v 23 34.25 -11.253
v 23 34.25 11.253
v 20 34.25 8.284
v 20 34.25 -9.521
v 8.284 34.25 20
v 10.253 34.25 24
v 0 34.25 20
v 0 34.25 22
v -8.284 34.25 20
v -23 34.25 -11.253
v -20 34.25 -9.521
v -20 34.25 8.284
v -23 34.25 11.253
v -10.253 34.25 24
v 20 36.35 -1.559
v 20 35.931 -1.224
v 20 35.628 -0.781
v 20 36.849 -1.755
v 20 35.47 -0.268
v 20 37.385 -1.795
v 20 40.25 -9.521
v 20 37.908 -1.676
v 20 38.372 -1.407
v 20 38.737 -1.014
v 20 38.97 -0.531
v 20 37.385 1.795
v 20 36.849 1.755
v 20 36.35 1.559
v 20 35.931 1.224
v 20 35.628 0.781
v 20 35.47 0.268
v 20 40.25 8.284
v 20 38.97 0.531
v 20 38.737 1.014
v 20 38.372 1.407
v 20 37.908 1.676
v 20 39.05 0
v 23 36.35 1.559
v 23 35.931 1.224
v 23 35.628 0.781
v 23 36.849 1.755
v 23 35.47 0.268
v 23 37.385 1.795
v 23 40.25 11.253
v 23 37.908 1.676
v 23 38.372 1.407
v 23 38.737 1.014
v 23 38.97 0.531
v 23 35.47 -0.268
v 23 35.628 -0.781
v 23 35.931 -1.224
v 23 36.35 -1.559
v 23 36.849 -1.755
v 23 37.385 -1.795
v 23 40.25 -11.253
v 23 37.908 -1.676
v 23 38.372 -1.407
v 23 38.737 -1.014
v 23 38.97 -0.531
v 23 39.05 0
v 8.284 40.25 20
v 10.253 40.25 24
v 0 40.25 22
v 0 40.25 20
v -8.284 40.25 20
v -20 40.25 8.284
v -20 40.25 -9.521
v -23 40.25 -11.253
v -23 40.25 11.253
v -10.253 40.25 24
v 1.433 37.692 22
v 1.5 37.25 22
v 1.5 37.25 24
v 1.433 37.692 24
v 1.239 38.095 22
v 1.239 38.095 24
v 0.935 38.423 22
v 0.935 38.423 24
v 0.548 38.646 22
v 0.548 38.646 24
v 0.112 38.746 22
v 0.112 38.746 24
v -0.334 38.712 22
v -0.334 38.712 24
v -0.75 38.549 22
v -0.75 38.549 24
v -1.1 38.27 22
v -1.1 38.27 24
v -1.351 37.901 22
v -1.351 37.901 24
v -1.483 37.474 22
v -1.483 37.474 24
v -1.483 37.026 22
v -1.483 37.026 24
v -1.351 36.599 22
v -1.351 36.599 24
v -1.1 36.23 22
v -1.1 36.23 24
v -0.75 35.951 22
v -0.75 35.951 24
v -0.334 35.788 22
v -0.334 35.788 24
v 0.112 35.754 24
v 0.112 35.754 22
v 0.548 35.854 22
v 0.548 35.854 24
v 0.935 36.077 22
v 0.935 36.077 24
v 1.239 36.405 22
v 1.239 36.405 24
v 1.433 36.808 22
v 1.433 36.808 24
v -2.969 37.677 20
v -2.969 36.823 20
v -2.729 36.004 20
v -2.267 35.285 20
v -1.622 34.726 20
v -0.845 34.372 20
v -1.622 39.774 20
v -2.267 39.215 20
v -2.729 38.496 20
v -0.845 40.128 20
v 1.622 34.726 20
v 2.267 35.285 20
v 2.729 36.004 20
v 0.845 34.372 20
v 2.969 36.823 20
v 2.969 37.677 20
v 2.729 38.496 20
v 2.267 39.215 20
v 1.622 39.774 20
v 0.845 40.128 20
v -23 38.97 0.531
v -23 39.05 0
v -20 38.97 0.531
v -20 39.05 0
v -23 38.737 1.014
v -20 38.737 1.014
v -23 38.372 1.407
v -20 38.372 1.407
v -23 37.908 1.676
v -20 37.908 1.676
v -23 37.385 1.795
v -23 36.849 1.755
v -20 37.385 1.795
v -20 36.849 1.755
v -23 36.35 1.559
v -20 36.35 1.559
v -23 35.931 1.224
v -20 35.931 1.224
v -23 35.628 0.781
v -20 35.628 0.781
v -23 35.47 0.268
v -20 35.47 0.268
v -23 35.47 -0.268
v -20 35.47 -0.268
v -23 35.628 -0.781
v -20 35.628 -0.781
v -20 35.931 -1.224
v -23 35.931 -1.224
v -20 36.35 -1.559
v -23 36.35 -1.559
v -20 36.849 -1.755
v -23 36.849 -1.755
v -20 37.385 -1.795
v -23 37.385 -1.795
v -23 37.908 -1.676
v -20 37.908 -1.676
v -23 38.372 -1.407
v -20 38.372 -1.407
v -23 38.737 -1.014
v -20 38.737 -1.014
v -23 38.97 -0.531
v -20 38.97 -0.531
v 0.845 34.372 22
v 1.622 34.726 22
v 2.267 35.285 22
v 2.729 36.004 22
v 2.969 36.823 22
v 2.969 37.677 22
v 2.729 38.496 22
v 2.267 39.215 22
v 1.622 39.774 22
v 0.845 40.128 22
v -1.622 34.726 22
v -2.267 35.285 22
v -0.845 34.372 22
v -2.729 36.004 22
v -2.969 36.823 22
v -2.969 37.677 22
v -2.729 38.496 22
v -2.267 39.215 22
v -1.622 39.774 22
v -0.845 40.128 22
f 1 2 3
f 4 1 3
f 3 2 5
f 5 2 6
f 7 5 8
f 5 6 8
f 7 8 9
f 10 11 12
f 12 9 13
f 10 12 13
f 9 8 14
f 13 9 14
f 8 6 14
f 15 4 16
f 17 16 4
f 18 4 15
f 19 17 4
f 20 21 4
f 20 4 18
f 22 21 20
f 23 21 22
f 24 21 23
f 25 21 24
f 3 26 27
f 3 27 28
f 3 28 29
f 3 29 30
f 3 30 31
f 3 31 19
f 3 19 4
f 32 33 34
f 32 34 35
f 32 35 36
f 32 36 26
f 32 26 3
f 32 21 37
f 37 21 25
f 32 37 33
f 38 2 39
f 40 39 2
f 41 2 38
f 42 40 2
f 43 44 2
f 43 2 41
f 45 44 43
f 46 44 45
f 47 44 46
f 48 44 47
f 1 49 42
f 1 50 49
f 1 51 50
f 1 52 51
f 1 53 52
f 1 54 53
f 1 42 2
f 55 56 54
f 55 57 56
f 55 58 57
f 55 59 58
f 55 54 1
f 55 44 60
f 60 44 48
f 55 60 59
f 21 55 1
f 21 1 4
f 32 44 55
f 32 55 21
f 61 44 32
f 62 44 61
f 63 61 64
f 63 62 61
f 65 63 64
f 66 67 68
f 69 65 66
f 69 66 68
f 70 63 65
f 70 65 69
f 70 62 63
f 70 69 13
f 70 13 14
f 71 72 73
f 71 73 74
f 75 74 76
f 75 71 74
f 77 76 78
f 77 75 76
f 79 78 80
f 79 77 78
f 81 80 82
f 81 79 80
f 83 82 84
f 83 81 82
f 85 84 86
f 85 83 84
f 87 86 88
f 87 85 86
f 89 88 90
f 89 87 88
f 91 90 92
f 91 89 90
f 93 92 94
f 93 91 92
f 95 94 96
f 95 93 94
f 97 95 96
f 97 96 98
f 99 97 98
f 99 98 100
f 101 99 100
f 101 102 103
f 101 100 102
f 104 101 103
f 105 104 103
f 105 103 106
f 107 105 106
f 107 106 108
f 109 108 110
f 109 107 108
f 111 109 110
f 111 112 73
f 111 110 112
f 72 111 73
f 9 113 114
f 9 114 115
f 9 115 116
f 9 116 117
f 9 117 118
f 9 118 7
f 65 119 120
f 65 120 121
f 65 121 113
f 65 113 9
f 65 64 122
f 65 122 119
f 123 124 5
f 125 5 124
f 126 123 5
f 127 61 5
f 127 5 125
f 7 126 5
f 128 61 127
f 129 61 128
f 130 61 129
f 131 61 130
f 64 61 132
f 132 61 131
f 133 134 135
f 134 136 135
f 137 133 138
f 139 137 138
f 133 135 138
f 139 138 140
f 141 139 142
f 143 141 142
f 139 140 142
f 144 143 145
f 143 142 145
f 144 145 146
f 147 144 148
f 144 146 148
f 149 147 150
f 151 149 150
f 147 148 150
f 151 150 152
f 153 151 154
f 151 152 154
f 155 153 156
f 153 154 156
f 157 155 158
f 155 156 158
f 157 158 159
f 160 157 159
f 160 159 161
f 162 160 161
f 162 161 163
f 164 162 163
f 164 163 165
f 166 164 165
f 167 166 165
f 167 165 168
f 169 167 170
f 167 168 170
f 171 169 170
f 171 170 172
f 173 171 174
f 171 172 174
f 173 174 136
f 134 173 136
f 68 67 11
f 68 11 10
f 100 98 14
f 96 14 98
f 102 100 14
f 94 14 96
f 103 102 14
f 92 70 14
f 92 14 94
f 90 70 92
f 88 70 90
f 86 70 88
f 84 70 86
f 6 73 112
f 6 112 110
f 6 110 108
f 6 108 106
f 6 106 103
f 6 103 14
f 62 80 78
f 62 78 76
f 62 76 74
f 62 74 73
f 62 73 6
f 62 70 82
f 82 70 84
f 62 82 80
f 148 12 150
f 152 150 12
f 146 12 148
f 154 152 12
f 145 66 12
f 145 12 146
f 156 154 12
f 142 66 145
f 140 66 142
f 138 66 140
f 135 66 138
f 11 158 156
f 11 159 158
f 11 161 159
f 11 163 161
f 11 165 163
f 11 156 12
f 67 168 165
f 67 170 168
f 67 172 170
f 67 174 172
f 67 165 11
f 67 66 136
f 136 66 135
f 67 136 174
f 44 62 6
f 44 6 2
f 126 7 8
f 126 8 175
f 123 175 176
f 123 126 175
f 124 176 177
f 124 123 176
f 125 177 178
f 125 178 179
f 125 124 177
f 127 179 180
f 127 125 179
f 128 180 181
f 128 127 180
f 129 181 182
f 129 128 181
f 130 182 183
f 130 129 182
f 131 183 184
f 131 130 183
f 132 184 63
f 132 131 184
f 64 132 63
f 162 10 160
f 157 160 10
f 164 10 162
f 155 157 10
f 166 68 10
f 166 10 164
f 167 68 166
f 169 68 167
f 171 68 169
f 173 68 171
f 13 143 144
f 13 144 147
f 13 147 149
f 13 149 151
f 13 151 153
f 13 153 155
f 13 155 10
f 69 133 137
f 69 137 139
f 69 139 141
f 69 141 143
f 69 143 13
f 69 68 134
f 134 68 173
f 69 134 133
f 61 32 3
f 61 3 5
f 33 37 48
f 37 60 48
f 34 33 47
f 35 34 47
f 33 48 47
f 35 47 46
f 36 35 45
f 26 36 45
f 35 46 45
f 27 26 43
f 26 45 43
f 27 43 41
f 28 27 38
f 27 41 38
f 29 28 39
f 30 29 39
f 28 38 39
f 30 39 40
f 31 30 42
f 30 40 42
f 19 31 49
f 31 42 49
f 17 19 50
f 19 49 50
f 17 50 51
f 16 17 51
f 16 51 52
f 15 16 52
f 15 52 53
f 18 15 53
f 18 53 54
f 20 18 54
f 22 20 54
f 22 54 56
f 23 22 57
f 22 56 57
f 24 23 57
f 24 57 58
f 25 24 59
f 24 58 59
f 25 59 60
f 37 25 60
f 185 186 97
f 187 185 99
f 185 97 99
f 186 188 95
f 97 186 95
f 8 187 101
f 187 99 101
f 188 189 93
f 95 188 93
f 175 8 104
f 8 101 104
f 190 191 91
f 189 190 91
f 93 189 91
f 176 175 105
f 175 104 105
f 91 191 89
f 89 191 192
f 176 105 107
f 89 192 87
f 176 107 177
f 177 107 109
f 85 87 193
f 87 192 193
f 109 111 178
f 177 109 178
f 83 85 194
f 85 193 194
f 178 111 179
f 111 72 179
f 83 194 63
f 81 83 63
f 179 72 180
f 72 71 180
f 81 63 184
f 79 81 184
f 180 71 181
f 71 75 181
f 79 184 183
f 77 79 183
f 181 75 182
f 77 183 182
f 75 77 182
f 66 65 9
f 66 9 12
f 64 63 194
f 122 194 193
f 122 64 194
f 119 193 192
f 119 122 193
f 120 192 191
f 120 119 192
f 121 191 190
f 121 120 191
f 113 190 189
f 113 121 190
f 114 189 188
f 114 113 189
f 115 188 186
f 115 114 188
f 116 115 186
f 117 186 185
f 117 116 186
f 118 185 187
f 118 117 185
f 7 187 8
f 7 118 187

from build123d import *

# Parameters (mm, degrees)
SKETCH139_R  = 1.8
PAD110_DEPTH = 50
SKETCH125_R  = 3
PAD099_DEPTH = 2
SKETCH123_R  = 1.5
PAD097_DEPTH = 50
PAD083_DEPTH = 6


with BuildPart() as sidemountscrewcutout:
    # Sketch139 → Pad110 (new body, symmetric)
    with BuildSketch(Plane(origin=(0, 34, 0), x_dir=(0, 1, 0), z_dir=(1, 0, 0))):
        with Locations((3.25, 0)):
            Circle(SKETCH139_R)
    extrude(amount=PAD110_DEPTH, both=True)


with BuildPart() as countersinkcutout:
    # Sketch125 → Pad099 (new body)
    with BuildSketch(Plane(origin=(0, 40, 20), x_dir=(1, 0, 0), z_dir=(0, 0, 1))):
        with Locations((0, -3)):
            Circle(SKETCH125_R)
    extrude(amount=PAD099_DEPTH)


with BuildPart() as cutout:
    # Sketch123 → Pad097 (new body)
    with BuildSketch(Plane(origin=(0, 40, 0), x_dir=(1, 0, 0), z_dir=(0, 0, 1))):
        with Locations((0, -3)):
            Circle(SKETCH123_R)
    extrude(amount=PAD097_DEPTH)

    # Fusion004020003: union CountersinkCutout
    add(countersinkcutout.part)


with BuildPart() as motorcagesupportrib:
    # Sketch110 → Pad083 (new body)
    with BuildSketch(Plane.XZ.offset(-40)):
        Polygon((-23, -11.252777), (-23, 11.252777), (-10.252777, 24), (10.252777, 24), (23, 11.252777), (23, -11.252777), (20, -9.520726), (20, 8.284271), (8.284271, 20), (-8.284271, 20), (-20, 8.284271), (-20, -9.520726), align=None)
    extrude(amount=PAD083_DEPTH)

    # Cut007019008: cut Cutout
    add(cutout.part, mode=Mode.SUBTRACT)


with BuildPart() as motorcagesupportrib_1:
    # Cut007019008 placement: moved
    add(motorcagesupportrib.part.moved(Location((0, 0.25, 0))))

    # Cut007019012: cut SideMountScrewCutout
    add(sidemountscrewcutout.part, mode=Mode.SUBTRACT)


solid = motorcagesupportrib_1.part
